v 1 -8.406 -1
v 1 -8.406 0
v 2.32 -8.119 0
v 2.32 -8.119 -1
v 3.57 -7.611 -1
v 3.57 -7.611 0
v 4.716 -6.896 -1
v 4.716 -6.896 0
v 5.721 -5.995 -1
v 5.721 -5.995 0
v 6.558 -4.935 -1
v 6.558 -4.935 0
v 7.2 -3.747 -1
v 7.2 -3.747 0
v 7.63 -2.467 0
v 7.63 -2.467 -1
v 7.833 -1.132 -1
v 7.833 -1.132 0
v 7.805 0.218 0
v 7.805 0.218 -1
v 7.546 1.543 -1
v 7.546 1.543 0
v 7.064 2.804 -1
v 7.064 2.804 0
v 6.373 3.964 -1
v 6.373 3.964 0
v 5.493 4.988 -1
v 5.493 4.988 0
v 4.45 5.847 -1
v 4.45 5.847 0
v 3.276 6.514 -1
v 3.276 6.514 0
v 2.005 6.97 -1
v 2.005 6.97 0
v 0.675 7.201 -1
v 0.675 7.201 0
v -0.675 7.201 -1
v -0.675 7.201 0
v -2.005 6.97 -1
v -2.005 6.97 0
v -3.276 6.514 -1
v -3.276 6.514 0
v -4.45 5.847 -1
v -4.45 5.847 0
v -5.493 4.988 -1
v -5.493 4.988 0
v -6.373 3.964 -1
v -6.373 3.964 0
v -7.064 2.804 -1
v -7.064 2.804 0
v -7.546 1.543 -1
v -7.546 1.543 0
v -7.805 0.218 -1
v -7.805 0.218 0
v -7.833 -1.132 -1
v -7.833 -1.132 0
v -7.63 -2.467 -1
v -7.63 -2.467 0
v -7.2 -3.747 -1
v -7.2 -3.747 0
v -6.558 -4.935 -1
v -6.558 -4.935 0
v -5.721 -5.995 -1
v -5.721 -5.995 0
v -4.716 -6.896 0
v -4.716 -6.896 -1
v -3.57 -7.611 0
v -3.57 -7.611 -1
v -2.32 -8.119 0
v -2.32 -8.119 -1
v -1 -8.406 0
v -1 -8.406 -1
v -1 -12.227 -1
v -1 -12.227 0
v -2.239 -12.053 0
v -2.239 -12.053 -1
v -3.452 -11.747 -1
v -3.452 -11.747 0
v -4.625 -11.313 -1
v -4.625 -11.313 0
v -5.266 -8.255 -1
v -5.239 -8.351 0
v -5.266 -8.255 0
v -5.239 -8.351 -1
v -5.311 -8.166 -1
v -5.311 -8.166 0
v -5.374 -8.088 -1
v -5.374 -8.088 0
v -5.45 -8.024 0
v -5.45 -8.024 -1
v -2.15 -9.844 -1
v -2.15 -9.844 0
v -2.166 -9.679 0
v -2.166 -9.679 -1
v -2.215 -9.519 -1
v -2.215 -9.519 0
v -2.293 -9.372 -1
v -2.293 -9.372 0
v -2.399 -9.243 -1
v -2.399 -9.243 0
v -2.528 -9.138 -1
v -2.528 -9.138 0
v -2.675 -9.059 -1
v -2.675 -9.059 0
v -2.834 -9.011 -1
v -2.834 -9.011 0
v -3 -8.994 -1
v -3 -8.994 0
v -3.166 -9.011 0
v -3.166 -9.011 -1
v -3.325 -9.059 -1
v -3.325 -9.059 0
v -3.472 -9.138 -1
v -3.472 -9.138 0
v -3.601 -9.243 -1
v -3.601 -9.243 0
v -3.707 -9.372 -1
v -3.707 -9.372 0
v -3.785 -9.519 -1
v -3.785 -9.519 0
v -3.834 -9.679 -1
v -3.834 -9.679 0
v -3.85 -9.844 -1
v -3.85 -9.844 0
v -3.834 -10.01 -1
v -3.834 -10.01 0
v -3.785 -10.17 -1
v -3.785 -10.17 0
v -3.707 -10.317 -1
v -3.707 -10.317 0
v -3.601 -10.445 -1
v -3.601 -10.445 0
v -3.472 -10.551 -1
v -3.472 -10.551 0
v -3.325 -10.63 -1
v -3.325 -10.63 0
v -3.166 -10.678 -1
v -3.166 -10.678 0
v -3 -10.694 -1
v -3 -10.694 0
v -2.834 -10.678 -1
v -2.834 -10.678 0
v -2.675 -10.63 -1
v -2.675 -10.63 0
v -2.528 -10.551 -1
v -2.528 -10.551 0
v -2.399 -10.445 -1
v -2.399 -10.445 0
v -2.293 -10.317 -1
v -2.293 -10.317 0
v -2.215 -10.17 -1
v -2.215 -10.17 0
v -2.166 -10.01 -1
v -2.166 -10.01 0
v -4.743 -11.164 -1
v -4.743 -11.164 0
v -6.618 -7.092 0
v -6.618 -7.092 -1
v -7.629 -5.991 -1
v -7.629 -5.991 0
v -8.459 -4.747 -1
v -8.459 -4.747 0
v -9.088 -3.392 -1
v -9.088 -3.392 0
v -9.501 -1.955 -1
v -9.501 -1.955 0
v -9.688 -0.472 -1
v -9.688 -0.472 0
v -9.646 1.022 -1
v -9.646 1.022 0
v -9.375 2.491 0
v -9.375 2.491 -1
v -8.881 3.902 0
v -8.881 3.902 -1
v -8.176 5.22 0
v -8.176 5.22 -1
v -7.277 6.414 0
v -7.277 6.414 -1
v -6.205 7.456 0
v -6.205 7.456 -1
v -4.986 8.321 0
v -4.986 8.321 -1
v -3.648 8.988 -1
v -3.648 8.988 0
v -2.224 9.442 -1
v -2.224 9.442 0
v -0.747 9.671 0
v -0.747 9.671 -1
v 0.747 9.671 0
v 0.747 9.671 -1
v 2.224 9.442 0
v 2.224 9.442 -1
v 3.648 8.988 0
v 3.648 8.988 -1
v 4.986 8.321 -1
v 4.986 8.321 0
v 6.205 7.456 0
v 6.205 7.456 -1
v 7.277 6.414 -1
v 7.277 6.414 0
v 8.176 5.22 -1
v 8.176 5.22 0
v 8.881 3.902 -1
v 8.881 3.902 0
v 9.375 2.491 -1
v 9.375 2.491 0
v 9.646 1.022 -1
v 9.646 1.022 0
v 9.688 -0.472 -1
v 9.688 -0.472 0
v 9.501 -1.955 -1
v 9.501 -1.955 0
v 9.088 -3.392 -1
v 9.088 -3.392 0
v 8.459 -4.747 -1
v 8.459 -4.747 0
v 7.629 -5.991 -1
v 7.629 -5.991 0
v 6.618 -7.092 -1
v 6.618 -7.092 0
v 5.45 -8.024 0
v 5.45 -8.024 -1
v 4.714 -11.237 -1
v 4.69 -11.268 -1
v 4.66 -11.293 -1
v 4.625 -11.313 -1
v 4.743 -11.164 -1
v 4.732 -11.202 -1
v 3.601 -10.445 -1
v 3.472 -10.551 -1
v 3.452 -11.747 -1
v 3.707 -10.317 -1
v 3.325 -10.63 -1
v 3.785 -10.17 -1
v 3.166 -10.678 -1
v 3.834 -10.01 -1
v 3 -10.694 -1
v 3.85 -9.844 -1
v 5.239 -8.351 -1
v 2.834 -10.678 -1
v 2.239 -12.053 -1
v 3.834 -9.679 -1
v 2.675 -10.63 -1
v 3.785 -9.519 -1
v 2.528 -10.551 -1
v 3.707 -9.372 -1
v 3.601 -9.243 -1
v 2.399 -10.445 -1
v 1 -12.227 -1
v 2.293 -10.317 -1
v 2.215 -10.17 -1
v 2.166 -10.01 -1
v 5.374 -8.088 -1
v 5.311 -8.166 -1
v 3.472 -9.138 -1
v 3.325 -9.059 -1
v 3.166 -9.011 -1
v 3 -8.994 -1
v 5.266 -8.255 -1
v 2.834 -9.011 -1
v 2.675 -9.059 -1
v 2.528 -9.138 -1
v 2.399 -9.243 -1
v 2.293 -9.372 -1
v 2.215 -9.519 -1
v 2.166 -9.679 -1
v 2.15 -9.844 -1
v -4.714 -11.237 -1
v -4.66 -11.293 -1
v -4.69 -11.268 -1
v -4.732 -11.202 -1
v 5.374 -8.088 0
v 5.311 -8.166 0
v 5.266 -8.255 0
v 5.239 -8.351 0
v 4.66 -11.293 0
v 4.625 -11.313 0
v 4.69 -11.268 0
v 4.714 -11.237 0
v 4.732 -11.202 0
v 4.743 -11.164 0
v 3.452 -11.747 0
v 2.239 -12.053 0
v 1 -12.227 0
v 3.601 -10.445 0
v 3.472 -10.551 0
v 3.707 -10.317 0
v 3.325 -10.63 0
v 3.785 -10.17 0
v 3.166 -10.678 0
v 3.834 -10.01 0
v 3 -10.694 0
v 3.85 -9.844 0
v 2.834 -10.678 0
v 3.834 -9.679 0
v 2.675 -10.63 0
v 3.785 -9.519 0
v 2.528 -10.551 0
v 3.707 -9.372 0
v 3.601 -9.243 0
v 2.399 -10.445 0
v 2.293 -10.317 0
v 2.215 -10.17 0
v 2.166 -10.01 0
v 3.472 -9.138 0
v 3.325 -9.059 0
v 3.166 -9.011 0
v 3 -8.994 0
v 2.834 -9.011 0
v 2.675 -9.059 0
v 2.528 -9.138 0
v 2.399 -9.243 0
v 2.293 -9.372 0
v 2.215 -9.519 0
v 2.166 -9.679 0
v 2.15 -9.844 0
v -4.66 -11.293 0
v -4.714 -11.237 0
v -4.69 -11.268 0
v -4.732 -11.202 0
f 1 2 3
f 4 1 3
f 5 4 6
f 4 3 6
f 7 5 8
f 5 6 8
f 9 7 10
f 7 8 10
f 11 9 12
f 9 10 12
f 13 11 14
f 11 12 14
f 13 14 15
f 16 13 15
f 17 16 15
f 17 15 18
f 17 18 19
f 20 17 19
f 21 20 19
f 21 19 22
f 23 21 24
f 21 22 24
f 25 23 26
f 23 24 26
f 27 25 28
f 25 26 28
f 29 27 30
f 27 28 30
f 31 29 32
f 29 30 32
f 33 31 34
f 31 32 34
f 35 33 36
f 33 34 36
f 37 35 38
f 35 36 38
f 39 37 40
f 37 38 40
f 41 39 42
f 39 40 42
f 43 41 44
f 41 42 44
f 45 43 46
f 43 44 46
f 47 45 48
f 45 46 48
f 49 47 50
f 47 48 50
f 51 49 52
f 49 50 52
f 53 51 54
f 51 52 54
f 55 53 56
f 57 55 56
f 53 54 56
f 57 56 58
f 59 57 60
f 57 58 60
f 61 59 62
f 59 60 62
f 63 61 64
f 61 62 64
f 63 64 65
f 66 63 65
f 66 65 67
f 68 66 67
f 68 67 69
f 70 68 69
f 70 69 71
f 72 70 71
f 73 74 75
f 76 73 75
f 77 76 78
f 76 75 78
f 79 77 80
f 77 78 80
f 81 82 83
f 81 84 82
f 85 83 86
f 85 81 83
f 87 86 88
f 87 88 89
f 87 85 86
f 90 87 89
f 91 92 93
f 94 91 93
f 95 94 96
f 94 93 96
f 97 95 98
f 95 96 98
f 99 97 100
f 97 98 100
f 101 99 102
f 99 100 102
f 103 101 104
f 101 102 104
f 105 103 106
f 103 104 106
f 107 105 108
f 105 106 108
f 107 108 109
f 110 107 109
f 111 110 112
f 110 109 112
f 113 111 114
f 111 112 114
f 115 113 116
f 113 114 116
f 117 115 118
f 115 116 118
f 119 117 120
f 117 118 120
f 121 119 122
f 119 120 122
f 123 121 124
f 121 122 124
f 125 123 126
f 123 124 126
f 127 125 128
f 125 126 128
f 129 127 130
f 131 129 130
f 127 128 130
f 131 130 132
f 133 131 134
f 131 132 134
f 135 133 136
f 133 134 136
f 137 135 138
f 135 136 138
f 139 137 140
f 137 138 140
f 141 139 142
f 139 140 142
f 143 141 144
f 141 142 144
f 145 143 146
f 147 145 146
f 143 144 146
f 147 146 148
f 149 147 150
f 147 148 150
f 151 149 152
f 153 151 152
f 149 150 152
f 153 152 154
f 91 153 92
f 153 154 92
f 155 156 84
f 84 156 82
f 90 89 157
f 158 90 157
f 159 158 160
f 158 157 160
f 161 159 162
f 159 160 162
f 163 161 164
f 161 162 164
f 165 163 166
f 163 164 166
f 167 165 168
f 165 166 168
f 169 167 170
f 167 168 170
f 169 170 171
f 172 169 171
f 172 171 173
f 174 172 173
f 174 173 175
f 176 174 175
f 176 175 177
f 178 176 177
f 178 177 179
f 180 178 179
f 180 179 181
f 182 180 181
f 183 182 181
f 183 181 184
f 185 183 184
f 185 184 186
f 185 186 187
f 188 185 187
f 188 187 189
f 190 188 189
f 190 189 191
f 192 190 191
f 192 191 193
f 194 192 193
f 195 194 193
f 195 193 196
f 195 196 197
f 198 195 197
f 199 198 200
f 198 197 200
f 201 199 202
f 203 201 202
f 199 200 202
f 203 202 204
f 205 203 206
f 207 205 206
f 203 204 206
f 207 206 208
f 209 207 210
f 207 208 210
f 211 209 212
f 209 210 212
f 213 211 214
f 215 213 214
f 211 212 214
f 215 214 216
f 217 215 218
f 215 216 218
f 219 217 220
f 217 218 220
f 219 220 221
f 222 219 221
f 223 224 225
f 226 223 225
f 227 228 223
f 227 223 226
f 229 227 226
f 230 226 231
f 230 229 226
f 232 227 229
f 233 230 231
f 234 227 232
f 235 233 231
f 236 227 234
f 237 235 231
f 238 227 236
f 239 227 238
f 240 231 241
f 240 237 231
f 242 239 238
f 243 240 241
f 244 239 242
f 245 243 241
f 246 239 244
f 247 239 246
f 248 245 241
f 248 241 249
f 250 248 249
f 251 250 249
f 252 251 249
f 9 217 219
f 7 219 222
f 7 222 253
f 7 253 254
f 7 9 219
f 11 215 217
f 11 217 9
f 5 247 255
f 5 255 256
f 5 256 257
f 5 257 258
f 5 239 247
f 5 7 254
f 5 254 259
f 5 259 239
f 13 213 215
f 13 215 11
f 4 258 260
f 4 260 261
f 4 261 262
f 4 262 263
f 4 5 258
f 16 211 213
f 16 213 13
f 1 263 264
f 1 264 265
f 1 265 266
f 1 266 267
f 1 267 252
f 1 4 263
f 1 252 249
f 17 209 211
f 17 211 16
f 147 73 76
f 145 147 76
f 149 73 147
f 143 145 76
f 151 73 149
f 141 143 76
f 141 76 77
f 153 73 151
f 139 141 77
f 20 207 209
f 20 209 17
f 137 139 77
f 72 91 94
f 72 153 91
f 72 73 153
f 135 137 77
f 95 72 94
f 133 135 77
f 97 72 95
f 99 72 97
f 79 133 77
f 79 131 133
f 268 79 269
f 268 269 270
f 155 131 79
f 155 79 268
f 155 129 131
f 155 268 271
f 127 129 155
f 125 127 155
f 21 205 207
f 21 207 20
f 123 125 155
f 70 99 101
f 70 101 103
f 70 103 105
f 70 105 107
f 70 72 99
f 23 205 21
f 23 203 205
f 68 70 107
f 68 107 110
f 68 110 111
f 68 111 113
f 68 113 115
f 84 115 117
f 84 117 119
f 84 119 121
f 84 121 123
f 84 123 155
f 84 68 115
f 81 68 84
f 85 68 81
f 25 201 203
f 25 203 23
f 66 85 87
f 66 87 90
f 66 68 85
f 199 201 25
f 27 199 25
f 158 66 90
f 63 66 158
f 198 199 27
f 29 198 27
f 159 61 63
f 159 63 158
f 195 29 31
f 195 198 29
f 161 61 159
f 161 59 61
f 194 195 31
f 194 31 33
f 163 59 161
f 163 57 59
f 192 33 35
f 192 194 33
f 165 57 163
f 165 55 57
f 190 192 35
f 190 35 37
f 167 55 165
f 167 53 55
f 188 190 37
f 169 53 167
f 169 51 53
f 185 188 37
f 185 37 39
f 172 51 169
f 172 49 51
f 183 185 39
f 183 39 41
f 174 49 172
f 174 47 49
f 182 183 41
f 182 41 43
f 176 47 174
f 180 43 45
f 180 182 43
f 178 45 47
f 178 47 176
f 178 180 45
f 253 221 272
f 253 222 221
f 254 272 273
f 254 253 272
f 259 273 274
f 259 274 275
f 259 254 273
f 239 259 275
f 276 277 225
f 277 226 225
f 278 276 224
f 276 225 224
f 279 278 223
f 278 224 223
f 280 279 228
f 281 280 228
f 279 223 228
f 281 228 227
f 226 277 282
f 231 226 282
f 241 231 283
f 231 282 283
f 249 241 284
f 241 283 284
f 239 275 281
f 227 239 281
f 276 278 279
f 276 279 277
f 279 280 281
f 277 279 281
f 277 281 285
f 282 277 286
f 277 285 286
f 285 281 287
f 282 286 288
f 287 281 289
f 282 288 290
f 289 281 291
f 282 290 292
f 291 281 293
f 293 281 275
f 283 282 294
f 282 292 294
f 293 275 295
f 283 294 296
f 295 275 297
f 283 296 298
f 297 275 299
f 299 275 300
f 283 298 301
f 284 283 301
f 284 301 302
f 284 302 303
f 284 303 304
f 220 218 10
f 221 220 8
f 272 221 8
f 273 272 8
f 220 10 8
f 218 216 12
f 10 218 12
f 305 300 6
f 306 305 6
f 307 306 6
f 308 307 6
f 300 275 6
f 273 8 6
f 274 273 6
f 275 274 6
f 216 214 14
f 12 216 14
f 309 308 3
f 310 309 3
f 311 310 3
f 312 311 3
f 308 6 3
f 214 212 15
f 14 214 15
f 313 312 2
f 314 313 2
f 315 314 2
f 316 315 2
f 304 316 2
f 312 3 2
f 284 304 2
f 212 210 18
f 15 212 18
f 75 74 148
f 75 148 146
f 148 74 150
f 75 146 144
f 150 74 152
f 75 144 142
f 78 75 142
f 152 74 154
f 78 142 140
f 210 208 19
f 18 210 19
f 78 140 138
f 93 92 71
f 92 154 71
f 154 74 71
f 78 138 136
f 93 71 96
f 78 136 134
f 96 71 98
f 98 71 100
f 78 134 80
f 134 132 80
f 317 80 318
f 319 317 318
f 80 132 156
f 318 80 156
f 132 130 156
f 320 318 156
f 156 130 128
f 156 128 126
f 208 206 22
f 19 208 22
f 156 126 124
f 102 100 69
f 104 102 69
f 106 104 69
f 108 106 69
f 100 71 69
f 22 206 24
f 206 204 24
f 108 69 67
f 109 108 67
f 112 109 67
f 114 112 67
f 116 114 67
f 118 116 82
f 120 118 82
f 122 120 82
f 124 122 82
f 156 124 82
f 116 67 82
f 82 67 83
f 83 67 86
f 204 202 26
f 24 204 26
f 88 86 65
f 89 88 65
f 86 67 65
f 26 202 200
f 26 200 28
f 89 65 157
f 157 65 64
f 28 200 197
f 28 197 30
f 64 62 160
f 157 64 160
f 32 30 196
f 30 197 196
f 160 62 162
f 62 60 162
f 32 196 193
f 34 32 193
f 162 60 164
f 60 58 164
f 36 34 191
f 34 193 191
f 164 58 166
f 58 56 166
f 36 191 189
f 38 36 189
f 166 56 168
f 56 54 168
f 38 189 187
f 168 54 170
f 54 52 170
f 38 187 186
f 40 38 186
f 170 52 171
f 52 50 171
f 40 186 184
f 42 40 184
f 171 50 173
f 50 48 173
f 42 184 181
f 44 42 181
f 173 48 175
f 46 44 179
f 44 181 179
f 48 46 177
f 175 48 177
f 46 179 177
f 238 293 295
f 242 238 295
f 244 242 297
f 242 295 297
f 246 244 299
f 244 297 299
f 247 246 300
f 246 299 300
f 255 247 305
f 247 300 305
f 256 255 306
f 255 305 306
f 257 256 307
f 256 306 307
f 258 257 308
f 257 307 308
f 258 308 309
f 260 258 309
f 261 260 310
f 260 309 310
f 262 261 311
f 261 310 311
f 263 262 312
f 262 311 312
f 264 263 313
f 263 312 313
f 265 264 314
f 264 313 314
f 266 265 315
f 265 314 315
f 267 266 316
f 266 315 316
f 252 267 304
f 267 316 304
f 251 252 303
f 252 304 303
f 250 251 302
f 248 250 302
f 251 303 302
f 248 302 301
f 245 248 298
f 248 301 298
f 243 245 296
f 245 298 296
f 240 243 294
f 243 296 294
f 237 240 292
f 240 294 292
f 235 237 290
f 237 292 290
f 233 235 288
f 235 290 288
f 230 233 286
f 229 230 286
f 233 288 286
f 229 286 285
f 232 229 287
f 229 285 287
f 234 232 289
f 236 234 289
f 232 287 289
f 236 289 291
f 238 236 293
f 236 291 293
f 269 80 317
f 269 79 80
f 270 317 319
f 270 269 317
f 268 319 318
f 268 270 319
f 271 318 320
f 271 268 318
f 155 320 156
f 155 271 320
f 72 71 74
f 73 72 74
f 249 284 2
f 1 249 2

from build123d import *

# Parameters (mm, degrees)
SKETCH1_R  = 0.85
BODY_DEPTH = 1
FILLET1_R  = 0.2
FILLET2_R  = 0.5


with BuildPart() as part:
    # Sketch1 → Body (new body)
    with BuildSketch(Plane.XY):
        with BuildLine():
            Line((-1, -8.406045209), (-1, -12.227002197))
            ThreePointArc((-1, -12.227002197), (-2.901836737, -11.902811864), (-4.724092893, -11.269199328))
            Line((-4.724092893, -11.269199328), (-5.275907107, -8.139705412))
            ThreePointArc((-5.275907107, -8.139705412), (0, 9.7), (5.275907107, -8.139705412))
            Line((5.275907107, -8.139705412), (4.724092893, -11.269199328))
            ThreePointArc((4.724092893, -11.269199328), (2.901836737, -11.902811864), (1, -12.227002197))
            Line((1, -12.227002197), (1, -8.406045209))
            ThreePointArc((1, -8.406045209), (0, 7.23), (-1, -8.406045209))
        make_face()
        with Locations((3, -9.844424101)):
            Circle(SKETCH1_R, mode=Mode.SUBTRACT)
        with Locations((-3, -9.844424101)):
            Circle(SKETCH1_R, mode=Mode.SUBTRACT)
    extrude(amount=-BODY_DEPTH)

    # Fillet1
    fillet1_edges = [part.edges().sort_by_distance(p)[0] for p in [
        (-4.724092893, -11.269199328, -0.5),
        (4.724092893, -11.269199328, -0.5),
    ]]
    fillet(fillet1_edges, radius=FILLET1_R)

    # Fillet2
    fillet2_edges = [part.edges().sort_by_distance(p)[0] for p in [
        (-5.275907107, -8.139705412, -0.5),
        (5.275907107, -8.139705412, -0.5),
    ]]
    fillet(fillet2_edges, radius=FILLET2_R)


solid = part.part
